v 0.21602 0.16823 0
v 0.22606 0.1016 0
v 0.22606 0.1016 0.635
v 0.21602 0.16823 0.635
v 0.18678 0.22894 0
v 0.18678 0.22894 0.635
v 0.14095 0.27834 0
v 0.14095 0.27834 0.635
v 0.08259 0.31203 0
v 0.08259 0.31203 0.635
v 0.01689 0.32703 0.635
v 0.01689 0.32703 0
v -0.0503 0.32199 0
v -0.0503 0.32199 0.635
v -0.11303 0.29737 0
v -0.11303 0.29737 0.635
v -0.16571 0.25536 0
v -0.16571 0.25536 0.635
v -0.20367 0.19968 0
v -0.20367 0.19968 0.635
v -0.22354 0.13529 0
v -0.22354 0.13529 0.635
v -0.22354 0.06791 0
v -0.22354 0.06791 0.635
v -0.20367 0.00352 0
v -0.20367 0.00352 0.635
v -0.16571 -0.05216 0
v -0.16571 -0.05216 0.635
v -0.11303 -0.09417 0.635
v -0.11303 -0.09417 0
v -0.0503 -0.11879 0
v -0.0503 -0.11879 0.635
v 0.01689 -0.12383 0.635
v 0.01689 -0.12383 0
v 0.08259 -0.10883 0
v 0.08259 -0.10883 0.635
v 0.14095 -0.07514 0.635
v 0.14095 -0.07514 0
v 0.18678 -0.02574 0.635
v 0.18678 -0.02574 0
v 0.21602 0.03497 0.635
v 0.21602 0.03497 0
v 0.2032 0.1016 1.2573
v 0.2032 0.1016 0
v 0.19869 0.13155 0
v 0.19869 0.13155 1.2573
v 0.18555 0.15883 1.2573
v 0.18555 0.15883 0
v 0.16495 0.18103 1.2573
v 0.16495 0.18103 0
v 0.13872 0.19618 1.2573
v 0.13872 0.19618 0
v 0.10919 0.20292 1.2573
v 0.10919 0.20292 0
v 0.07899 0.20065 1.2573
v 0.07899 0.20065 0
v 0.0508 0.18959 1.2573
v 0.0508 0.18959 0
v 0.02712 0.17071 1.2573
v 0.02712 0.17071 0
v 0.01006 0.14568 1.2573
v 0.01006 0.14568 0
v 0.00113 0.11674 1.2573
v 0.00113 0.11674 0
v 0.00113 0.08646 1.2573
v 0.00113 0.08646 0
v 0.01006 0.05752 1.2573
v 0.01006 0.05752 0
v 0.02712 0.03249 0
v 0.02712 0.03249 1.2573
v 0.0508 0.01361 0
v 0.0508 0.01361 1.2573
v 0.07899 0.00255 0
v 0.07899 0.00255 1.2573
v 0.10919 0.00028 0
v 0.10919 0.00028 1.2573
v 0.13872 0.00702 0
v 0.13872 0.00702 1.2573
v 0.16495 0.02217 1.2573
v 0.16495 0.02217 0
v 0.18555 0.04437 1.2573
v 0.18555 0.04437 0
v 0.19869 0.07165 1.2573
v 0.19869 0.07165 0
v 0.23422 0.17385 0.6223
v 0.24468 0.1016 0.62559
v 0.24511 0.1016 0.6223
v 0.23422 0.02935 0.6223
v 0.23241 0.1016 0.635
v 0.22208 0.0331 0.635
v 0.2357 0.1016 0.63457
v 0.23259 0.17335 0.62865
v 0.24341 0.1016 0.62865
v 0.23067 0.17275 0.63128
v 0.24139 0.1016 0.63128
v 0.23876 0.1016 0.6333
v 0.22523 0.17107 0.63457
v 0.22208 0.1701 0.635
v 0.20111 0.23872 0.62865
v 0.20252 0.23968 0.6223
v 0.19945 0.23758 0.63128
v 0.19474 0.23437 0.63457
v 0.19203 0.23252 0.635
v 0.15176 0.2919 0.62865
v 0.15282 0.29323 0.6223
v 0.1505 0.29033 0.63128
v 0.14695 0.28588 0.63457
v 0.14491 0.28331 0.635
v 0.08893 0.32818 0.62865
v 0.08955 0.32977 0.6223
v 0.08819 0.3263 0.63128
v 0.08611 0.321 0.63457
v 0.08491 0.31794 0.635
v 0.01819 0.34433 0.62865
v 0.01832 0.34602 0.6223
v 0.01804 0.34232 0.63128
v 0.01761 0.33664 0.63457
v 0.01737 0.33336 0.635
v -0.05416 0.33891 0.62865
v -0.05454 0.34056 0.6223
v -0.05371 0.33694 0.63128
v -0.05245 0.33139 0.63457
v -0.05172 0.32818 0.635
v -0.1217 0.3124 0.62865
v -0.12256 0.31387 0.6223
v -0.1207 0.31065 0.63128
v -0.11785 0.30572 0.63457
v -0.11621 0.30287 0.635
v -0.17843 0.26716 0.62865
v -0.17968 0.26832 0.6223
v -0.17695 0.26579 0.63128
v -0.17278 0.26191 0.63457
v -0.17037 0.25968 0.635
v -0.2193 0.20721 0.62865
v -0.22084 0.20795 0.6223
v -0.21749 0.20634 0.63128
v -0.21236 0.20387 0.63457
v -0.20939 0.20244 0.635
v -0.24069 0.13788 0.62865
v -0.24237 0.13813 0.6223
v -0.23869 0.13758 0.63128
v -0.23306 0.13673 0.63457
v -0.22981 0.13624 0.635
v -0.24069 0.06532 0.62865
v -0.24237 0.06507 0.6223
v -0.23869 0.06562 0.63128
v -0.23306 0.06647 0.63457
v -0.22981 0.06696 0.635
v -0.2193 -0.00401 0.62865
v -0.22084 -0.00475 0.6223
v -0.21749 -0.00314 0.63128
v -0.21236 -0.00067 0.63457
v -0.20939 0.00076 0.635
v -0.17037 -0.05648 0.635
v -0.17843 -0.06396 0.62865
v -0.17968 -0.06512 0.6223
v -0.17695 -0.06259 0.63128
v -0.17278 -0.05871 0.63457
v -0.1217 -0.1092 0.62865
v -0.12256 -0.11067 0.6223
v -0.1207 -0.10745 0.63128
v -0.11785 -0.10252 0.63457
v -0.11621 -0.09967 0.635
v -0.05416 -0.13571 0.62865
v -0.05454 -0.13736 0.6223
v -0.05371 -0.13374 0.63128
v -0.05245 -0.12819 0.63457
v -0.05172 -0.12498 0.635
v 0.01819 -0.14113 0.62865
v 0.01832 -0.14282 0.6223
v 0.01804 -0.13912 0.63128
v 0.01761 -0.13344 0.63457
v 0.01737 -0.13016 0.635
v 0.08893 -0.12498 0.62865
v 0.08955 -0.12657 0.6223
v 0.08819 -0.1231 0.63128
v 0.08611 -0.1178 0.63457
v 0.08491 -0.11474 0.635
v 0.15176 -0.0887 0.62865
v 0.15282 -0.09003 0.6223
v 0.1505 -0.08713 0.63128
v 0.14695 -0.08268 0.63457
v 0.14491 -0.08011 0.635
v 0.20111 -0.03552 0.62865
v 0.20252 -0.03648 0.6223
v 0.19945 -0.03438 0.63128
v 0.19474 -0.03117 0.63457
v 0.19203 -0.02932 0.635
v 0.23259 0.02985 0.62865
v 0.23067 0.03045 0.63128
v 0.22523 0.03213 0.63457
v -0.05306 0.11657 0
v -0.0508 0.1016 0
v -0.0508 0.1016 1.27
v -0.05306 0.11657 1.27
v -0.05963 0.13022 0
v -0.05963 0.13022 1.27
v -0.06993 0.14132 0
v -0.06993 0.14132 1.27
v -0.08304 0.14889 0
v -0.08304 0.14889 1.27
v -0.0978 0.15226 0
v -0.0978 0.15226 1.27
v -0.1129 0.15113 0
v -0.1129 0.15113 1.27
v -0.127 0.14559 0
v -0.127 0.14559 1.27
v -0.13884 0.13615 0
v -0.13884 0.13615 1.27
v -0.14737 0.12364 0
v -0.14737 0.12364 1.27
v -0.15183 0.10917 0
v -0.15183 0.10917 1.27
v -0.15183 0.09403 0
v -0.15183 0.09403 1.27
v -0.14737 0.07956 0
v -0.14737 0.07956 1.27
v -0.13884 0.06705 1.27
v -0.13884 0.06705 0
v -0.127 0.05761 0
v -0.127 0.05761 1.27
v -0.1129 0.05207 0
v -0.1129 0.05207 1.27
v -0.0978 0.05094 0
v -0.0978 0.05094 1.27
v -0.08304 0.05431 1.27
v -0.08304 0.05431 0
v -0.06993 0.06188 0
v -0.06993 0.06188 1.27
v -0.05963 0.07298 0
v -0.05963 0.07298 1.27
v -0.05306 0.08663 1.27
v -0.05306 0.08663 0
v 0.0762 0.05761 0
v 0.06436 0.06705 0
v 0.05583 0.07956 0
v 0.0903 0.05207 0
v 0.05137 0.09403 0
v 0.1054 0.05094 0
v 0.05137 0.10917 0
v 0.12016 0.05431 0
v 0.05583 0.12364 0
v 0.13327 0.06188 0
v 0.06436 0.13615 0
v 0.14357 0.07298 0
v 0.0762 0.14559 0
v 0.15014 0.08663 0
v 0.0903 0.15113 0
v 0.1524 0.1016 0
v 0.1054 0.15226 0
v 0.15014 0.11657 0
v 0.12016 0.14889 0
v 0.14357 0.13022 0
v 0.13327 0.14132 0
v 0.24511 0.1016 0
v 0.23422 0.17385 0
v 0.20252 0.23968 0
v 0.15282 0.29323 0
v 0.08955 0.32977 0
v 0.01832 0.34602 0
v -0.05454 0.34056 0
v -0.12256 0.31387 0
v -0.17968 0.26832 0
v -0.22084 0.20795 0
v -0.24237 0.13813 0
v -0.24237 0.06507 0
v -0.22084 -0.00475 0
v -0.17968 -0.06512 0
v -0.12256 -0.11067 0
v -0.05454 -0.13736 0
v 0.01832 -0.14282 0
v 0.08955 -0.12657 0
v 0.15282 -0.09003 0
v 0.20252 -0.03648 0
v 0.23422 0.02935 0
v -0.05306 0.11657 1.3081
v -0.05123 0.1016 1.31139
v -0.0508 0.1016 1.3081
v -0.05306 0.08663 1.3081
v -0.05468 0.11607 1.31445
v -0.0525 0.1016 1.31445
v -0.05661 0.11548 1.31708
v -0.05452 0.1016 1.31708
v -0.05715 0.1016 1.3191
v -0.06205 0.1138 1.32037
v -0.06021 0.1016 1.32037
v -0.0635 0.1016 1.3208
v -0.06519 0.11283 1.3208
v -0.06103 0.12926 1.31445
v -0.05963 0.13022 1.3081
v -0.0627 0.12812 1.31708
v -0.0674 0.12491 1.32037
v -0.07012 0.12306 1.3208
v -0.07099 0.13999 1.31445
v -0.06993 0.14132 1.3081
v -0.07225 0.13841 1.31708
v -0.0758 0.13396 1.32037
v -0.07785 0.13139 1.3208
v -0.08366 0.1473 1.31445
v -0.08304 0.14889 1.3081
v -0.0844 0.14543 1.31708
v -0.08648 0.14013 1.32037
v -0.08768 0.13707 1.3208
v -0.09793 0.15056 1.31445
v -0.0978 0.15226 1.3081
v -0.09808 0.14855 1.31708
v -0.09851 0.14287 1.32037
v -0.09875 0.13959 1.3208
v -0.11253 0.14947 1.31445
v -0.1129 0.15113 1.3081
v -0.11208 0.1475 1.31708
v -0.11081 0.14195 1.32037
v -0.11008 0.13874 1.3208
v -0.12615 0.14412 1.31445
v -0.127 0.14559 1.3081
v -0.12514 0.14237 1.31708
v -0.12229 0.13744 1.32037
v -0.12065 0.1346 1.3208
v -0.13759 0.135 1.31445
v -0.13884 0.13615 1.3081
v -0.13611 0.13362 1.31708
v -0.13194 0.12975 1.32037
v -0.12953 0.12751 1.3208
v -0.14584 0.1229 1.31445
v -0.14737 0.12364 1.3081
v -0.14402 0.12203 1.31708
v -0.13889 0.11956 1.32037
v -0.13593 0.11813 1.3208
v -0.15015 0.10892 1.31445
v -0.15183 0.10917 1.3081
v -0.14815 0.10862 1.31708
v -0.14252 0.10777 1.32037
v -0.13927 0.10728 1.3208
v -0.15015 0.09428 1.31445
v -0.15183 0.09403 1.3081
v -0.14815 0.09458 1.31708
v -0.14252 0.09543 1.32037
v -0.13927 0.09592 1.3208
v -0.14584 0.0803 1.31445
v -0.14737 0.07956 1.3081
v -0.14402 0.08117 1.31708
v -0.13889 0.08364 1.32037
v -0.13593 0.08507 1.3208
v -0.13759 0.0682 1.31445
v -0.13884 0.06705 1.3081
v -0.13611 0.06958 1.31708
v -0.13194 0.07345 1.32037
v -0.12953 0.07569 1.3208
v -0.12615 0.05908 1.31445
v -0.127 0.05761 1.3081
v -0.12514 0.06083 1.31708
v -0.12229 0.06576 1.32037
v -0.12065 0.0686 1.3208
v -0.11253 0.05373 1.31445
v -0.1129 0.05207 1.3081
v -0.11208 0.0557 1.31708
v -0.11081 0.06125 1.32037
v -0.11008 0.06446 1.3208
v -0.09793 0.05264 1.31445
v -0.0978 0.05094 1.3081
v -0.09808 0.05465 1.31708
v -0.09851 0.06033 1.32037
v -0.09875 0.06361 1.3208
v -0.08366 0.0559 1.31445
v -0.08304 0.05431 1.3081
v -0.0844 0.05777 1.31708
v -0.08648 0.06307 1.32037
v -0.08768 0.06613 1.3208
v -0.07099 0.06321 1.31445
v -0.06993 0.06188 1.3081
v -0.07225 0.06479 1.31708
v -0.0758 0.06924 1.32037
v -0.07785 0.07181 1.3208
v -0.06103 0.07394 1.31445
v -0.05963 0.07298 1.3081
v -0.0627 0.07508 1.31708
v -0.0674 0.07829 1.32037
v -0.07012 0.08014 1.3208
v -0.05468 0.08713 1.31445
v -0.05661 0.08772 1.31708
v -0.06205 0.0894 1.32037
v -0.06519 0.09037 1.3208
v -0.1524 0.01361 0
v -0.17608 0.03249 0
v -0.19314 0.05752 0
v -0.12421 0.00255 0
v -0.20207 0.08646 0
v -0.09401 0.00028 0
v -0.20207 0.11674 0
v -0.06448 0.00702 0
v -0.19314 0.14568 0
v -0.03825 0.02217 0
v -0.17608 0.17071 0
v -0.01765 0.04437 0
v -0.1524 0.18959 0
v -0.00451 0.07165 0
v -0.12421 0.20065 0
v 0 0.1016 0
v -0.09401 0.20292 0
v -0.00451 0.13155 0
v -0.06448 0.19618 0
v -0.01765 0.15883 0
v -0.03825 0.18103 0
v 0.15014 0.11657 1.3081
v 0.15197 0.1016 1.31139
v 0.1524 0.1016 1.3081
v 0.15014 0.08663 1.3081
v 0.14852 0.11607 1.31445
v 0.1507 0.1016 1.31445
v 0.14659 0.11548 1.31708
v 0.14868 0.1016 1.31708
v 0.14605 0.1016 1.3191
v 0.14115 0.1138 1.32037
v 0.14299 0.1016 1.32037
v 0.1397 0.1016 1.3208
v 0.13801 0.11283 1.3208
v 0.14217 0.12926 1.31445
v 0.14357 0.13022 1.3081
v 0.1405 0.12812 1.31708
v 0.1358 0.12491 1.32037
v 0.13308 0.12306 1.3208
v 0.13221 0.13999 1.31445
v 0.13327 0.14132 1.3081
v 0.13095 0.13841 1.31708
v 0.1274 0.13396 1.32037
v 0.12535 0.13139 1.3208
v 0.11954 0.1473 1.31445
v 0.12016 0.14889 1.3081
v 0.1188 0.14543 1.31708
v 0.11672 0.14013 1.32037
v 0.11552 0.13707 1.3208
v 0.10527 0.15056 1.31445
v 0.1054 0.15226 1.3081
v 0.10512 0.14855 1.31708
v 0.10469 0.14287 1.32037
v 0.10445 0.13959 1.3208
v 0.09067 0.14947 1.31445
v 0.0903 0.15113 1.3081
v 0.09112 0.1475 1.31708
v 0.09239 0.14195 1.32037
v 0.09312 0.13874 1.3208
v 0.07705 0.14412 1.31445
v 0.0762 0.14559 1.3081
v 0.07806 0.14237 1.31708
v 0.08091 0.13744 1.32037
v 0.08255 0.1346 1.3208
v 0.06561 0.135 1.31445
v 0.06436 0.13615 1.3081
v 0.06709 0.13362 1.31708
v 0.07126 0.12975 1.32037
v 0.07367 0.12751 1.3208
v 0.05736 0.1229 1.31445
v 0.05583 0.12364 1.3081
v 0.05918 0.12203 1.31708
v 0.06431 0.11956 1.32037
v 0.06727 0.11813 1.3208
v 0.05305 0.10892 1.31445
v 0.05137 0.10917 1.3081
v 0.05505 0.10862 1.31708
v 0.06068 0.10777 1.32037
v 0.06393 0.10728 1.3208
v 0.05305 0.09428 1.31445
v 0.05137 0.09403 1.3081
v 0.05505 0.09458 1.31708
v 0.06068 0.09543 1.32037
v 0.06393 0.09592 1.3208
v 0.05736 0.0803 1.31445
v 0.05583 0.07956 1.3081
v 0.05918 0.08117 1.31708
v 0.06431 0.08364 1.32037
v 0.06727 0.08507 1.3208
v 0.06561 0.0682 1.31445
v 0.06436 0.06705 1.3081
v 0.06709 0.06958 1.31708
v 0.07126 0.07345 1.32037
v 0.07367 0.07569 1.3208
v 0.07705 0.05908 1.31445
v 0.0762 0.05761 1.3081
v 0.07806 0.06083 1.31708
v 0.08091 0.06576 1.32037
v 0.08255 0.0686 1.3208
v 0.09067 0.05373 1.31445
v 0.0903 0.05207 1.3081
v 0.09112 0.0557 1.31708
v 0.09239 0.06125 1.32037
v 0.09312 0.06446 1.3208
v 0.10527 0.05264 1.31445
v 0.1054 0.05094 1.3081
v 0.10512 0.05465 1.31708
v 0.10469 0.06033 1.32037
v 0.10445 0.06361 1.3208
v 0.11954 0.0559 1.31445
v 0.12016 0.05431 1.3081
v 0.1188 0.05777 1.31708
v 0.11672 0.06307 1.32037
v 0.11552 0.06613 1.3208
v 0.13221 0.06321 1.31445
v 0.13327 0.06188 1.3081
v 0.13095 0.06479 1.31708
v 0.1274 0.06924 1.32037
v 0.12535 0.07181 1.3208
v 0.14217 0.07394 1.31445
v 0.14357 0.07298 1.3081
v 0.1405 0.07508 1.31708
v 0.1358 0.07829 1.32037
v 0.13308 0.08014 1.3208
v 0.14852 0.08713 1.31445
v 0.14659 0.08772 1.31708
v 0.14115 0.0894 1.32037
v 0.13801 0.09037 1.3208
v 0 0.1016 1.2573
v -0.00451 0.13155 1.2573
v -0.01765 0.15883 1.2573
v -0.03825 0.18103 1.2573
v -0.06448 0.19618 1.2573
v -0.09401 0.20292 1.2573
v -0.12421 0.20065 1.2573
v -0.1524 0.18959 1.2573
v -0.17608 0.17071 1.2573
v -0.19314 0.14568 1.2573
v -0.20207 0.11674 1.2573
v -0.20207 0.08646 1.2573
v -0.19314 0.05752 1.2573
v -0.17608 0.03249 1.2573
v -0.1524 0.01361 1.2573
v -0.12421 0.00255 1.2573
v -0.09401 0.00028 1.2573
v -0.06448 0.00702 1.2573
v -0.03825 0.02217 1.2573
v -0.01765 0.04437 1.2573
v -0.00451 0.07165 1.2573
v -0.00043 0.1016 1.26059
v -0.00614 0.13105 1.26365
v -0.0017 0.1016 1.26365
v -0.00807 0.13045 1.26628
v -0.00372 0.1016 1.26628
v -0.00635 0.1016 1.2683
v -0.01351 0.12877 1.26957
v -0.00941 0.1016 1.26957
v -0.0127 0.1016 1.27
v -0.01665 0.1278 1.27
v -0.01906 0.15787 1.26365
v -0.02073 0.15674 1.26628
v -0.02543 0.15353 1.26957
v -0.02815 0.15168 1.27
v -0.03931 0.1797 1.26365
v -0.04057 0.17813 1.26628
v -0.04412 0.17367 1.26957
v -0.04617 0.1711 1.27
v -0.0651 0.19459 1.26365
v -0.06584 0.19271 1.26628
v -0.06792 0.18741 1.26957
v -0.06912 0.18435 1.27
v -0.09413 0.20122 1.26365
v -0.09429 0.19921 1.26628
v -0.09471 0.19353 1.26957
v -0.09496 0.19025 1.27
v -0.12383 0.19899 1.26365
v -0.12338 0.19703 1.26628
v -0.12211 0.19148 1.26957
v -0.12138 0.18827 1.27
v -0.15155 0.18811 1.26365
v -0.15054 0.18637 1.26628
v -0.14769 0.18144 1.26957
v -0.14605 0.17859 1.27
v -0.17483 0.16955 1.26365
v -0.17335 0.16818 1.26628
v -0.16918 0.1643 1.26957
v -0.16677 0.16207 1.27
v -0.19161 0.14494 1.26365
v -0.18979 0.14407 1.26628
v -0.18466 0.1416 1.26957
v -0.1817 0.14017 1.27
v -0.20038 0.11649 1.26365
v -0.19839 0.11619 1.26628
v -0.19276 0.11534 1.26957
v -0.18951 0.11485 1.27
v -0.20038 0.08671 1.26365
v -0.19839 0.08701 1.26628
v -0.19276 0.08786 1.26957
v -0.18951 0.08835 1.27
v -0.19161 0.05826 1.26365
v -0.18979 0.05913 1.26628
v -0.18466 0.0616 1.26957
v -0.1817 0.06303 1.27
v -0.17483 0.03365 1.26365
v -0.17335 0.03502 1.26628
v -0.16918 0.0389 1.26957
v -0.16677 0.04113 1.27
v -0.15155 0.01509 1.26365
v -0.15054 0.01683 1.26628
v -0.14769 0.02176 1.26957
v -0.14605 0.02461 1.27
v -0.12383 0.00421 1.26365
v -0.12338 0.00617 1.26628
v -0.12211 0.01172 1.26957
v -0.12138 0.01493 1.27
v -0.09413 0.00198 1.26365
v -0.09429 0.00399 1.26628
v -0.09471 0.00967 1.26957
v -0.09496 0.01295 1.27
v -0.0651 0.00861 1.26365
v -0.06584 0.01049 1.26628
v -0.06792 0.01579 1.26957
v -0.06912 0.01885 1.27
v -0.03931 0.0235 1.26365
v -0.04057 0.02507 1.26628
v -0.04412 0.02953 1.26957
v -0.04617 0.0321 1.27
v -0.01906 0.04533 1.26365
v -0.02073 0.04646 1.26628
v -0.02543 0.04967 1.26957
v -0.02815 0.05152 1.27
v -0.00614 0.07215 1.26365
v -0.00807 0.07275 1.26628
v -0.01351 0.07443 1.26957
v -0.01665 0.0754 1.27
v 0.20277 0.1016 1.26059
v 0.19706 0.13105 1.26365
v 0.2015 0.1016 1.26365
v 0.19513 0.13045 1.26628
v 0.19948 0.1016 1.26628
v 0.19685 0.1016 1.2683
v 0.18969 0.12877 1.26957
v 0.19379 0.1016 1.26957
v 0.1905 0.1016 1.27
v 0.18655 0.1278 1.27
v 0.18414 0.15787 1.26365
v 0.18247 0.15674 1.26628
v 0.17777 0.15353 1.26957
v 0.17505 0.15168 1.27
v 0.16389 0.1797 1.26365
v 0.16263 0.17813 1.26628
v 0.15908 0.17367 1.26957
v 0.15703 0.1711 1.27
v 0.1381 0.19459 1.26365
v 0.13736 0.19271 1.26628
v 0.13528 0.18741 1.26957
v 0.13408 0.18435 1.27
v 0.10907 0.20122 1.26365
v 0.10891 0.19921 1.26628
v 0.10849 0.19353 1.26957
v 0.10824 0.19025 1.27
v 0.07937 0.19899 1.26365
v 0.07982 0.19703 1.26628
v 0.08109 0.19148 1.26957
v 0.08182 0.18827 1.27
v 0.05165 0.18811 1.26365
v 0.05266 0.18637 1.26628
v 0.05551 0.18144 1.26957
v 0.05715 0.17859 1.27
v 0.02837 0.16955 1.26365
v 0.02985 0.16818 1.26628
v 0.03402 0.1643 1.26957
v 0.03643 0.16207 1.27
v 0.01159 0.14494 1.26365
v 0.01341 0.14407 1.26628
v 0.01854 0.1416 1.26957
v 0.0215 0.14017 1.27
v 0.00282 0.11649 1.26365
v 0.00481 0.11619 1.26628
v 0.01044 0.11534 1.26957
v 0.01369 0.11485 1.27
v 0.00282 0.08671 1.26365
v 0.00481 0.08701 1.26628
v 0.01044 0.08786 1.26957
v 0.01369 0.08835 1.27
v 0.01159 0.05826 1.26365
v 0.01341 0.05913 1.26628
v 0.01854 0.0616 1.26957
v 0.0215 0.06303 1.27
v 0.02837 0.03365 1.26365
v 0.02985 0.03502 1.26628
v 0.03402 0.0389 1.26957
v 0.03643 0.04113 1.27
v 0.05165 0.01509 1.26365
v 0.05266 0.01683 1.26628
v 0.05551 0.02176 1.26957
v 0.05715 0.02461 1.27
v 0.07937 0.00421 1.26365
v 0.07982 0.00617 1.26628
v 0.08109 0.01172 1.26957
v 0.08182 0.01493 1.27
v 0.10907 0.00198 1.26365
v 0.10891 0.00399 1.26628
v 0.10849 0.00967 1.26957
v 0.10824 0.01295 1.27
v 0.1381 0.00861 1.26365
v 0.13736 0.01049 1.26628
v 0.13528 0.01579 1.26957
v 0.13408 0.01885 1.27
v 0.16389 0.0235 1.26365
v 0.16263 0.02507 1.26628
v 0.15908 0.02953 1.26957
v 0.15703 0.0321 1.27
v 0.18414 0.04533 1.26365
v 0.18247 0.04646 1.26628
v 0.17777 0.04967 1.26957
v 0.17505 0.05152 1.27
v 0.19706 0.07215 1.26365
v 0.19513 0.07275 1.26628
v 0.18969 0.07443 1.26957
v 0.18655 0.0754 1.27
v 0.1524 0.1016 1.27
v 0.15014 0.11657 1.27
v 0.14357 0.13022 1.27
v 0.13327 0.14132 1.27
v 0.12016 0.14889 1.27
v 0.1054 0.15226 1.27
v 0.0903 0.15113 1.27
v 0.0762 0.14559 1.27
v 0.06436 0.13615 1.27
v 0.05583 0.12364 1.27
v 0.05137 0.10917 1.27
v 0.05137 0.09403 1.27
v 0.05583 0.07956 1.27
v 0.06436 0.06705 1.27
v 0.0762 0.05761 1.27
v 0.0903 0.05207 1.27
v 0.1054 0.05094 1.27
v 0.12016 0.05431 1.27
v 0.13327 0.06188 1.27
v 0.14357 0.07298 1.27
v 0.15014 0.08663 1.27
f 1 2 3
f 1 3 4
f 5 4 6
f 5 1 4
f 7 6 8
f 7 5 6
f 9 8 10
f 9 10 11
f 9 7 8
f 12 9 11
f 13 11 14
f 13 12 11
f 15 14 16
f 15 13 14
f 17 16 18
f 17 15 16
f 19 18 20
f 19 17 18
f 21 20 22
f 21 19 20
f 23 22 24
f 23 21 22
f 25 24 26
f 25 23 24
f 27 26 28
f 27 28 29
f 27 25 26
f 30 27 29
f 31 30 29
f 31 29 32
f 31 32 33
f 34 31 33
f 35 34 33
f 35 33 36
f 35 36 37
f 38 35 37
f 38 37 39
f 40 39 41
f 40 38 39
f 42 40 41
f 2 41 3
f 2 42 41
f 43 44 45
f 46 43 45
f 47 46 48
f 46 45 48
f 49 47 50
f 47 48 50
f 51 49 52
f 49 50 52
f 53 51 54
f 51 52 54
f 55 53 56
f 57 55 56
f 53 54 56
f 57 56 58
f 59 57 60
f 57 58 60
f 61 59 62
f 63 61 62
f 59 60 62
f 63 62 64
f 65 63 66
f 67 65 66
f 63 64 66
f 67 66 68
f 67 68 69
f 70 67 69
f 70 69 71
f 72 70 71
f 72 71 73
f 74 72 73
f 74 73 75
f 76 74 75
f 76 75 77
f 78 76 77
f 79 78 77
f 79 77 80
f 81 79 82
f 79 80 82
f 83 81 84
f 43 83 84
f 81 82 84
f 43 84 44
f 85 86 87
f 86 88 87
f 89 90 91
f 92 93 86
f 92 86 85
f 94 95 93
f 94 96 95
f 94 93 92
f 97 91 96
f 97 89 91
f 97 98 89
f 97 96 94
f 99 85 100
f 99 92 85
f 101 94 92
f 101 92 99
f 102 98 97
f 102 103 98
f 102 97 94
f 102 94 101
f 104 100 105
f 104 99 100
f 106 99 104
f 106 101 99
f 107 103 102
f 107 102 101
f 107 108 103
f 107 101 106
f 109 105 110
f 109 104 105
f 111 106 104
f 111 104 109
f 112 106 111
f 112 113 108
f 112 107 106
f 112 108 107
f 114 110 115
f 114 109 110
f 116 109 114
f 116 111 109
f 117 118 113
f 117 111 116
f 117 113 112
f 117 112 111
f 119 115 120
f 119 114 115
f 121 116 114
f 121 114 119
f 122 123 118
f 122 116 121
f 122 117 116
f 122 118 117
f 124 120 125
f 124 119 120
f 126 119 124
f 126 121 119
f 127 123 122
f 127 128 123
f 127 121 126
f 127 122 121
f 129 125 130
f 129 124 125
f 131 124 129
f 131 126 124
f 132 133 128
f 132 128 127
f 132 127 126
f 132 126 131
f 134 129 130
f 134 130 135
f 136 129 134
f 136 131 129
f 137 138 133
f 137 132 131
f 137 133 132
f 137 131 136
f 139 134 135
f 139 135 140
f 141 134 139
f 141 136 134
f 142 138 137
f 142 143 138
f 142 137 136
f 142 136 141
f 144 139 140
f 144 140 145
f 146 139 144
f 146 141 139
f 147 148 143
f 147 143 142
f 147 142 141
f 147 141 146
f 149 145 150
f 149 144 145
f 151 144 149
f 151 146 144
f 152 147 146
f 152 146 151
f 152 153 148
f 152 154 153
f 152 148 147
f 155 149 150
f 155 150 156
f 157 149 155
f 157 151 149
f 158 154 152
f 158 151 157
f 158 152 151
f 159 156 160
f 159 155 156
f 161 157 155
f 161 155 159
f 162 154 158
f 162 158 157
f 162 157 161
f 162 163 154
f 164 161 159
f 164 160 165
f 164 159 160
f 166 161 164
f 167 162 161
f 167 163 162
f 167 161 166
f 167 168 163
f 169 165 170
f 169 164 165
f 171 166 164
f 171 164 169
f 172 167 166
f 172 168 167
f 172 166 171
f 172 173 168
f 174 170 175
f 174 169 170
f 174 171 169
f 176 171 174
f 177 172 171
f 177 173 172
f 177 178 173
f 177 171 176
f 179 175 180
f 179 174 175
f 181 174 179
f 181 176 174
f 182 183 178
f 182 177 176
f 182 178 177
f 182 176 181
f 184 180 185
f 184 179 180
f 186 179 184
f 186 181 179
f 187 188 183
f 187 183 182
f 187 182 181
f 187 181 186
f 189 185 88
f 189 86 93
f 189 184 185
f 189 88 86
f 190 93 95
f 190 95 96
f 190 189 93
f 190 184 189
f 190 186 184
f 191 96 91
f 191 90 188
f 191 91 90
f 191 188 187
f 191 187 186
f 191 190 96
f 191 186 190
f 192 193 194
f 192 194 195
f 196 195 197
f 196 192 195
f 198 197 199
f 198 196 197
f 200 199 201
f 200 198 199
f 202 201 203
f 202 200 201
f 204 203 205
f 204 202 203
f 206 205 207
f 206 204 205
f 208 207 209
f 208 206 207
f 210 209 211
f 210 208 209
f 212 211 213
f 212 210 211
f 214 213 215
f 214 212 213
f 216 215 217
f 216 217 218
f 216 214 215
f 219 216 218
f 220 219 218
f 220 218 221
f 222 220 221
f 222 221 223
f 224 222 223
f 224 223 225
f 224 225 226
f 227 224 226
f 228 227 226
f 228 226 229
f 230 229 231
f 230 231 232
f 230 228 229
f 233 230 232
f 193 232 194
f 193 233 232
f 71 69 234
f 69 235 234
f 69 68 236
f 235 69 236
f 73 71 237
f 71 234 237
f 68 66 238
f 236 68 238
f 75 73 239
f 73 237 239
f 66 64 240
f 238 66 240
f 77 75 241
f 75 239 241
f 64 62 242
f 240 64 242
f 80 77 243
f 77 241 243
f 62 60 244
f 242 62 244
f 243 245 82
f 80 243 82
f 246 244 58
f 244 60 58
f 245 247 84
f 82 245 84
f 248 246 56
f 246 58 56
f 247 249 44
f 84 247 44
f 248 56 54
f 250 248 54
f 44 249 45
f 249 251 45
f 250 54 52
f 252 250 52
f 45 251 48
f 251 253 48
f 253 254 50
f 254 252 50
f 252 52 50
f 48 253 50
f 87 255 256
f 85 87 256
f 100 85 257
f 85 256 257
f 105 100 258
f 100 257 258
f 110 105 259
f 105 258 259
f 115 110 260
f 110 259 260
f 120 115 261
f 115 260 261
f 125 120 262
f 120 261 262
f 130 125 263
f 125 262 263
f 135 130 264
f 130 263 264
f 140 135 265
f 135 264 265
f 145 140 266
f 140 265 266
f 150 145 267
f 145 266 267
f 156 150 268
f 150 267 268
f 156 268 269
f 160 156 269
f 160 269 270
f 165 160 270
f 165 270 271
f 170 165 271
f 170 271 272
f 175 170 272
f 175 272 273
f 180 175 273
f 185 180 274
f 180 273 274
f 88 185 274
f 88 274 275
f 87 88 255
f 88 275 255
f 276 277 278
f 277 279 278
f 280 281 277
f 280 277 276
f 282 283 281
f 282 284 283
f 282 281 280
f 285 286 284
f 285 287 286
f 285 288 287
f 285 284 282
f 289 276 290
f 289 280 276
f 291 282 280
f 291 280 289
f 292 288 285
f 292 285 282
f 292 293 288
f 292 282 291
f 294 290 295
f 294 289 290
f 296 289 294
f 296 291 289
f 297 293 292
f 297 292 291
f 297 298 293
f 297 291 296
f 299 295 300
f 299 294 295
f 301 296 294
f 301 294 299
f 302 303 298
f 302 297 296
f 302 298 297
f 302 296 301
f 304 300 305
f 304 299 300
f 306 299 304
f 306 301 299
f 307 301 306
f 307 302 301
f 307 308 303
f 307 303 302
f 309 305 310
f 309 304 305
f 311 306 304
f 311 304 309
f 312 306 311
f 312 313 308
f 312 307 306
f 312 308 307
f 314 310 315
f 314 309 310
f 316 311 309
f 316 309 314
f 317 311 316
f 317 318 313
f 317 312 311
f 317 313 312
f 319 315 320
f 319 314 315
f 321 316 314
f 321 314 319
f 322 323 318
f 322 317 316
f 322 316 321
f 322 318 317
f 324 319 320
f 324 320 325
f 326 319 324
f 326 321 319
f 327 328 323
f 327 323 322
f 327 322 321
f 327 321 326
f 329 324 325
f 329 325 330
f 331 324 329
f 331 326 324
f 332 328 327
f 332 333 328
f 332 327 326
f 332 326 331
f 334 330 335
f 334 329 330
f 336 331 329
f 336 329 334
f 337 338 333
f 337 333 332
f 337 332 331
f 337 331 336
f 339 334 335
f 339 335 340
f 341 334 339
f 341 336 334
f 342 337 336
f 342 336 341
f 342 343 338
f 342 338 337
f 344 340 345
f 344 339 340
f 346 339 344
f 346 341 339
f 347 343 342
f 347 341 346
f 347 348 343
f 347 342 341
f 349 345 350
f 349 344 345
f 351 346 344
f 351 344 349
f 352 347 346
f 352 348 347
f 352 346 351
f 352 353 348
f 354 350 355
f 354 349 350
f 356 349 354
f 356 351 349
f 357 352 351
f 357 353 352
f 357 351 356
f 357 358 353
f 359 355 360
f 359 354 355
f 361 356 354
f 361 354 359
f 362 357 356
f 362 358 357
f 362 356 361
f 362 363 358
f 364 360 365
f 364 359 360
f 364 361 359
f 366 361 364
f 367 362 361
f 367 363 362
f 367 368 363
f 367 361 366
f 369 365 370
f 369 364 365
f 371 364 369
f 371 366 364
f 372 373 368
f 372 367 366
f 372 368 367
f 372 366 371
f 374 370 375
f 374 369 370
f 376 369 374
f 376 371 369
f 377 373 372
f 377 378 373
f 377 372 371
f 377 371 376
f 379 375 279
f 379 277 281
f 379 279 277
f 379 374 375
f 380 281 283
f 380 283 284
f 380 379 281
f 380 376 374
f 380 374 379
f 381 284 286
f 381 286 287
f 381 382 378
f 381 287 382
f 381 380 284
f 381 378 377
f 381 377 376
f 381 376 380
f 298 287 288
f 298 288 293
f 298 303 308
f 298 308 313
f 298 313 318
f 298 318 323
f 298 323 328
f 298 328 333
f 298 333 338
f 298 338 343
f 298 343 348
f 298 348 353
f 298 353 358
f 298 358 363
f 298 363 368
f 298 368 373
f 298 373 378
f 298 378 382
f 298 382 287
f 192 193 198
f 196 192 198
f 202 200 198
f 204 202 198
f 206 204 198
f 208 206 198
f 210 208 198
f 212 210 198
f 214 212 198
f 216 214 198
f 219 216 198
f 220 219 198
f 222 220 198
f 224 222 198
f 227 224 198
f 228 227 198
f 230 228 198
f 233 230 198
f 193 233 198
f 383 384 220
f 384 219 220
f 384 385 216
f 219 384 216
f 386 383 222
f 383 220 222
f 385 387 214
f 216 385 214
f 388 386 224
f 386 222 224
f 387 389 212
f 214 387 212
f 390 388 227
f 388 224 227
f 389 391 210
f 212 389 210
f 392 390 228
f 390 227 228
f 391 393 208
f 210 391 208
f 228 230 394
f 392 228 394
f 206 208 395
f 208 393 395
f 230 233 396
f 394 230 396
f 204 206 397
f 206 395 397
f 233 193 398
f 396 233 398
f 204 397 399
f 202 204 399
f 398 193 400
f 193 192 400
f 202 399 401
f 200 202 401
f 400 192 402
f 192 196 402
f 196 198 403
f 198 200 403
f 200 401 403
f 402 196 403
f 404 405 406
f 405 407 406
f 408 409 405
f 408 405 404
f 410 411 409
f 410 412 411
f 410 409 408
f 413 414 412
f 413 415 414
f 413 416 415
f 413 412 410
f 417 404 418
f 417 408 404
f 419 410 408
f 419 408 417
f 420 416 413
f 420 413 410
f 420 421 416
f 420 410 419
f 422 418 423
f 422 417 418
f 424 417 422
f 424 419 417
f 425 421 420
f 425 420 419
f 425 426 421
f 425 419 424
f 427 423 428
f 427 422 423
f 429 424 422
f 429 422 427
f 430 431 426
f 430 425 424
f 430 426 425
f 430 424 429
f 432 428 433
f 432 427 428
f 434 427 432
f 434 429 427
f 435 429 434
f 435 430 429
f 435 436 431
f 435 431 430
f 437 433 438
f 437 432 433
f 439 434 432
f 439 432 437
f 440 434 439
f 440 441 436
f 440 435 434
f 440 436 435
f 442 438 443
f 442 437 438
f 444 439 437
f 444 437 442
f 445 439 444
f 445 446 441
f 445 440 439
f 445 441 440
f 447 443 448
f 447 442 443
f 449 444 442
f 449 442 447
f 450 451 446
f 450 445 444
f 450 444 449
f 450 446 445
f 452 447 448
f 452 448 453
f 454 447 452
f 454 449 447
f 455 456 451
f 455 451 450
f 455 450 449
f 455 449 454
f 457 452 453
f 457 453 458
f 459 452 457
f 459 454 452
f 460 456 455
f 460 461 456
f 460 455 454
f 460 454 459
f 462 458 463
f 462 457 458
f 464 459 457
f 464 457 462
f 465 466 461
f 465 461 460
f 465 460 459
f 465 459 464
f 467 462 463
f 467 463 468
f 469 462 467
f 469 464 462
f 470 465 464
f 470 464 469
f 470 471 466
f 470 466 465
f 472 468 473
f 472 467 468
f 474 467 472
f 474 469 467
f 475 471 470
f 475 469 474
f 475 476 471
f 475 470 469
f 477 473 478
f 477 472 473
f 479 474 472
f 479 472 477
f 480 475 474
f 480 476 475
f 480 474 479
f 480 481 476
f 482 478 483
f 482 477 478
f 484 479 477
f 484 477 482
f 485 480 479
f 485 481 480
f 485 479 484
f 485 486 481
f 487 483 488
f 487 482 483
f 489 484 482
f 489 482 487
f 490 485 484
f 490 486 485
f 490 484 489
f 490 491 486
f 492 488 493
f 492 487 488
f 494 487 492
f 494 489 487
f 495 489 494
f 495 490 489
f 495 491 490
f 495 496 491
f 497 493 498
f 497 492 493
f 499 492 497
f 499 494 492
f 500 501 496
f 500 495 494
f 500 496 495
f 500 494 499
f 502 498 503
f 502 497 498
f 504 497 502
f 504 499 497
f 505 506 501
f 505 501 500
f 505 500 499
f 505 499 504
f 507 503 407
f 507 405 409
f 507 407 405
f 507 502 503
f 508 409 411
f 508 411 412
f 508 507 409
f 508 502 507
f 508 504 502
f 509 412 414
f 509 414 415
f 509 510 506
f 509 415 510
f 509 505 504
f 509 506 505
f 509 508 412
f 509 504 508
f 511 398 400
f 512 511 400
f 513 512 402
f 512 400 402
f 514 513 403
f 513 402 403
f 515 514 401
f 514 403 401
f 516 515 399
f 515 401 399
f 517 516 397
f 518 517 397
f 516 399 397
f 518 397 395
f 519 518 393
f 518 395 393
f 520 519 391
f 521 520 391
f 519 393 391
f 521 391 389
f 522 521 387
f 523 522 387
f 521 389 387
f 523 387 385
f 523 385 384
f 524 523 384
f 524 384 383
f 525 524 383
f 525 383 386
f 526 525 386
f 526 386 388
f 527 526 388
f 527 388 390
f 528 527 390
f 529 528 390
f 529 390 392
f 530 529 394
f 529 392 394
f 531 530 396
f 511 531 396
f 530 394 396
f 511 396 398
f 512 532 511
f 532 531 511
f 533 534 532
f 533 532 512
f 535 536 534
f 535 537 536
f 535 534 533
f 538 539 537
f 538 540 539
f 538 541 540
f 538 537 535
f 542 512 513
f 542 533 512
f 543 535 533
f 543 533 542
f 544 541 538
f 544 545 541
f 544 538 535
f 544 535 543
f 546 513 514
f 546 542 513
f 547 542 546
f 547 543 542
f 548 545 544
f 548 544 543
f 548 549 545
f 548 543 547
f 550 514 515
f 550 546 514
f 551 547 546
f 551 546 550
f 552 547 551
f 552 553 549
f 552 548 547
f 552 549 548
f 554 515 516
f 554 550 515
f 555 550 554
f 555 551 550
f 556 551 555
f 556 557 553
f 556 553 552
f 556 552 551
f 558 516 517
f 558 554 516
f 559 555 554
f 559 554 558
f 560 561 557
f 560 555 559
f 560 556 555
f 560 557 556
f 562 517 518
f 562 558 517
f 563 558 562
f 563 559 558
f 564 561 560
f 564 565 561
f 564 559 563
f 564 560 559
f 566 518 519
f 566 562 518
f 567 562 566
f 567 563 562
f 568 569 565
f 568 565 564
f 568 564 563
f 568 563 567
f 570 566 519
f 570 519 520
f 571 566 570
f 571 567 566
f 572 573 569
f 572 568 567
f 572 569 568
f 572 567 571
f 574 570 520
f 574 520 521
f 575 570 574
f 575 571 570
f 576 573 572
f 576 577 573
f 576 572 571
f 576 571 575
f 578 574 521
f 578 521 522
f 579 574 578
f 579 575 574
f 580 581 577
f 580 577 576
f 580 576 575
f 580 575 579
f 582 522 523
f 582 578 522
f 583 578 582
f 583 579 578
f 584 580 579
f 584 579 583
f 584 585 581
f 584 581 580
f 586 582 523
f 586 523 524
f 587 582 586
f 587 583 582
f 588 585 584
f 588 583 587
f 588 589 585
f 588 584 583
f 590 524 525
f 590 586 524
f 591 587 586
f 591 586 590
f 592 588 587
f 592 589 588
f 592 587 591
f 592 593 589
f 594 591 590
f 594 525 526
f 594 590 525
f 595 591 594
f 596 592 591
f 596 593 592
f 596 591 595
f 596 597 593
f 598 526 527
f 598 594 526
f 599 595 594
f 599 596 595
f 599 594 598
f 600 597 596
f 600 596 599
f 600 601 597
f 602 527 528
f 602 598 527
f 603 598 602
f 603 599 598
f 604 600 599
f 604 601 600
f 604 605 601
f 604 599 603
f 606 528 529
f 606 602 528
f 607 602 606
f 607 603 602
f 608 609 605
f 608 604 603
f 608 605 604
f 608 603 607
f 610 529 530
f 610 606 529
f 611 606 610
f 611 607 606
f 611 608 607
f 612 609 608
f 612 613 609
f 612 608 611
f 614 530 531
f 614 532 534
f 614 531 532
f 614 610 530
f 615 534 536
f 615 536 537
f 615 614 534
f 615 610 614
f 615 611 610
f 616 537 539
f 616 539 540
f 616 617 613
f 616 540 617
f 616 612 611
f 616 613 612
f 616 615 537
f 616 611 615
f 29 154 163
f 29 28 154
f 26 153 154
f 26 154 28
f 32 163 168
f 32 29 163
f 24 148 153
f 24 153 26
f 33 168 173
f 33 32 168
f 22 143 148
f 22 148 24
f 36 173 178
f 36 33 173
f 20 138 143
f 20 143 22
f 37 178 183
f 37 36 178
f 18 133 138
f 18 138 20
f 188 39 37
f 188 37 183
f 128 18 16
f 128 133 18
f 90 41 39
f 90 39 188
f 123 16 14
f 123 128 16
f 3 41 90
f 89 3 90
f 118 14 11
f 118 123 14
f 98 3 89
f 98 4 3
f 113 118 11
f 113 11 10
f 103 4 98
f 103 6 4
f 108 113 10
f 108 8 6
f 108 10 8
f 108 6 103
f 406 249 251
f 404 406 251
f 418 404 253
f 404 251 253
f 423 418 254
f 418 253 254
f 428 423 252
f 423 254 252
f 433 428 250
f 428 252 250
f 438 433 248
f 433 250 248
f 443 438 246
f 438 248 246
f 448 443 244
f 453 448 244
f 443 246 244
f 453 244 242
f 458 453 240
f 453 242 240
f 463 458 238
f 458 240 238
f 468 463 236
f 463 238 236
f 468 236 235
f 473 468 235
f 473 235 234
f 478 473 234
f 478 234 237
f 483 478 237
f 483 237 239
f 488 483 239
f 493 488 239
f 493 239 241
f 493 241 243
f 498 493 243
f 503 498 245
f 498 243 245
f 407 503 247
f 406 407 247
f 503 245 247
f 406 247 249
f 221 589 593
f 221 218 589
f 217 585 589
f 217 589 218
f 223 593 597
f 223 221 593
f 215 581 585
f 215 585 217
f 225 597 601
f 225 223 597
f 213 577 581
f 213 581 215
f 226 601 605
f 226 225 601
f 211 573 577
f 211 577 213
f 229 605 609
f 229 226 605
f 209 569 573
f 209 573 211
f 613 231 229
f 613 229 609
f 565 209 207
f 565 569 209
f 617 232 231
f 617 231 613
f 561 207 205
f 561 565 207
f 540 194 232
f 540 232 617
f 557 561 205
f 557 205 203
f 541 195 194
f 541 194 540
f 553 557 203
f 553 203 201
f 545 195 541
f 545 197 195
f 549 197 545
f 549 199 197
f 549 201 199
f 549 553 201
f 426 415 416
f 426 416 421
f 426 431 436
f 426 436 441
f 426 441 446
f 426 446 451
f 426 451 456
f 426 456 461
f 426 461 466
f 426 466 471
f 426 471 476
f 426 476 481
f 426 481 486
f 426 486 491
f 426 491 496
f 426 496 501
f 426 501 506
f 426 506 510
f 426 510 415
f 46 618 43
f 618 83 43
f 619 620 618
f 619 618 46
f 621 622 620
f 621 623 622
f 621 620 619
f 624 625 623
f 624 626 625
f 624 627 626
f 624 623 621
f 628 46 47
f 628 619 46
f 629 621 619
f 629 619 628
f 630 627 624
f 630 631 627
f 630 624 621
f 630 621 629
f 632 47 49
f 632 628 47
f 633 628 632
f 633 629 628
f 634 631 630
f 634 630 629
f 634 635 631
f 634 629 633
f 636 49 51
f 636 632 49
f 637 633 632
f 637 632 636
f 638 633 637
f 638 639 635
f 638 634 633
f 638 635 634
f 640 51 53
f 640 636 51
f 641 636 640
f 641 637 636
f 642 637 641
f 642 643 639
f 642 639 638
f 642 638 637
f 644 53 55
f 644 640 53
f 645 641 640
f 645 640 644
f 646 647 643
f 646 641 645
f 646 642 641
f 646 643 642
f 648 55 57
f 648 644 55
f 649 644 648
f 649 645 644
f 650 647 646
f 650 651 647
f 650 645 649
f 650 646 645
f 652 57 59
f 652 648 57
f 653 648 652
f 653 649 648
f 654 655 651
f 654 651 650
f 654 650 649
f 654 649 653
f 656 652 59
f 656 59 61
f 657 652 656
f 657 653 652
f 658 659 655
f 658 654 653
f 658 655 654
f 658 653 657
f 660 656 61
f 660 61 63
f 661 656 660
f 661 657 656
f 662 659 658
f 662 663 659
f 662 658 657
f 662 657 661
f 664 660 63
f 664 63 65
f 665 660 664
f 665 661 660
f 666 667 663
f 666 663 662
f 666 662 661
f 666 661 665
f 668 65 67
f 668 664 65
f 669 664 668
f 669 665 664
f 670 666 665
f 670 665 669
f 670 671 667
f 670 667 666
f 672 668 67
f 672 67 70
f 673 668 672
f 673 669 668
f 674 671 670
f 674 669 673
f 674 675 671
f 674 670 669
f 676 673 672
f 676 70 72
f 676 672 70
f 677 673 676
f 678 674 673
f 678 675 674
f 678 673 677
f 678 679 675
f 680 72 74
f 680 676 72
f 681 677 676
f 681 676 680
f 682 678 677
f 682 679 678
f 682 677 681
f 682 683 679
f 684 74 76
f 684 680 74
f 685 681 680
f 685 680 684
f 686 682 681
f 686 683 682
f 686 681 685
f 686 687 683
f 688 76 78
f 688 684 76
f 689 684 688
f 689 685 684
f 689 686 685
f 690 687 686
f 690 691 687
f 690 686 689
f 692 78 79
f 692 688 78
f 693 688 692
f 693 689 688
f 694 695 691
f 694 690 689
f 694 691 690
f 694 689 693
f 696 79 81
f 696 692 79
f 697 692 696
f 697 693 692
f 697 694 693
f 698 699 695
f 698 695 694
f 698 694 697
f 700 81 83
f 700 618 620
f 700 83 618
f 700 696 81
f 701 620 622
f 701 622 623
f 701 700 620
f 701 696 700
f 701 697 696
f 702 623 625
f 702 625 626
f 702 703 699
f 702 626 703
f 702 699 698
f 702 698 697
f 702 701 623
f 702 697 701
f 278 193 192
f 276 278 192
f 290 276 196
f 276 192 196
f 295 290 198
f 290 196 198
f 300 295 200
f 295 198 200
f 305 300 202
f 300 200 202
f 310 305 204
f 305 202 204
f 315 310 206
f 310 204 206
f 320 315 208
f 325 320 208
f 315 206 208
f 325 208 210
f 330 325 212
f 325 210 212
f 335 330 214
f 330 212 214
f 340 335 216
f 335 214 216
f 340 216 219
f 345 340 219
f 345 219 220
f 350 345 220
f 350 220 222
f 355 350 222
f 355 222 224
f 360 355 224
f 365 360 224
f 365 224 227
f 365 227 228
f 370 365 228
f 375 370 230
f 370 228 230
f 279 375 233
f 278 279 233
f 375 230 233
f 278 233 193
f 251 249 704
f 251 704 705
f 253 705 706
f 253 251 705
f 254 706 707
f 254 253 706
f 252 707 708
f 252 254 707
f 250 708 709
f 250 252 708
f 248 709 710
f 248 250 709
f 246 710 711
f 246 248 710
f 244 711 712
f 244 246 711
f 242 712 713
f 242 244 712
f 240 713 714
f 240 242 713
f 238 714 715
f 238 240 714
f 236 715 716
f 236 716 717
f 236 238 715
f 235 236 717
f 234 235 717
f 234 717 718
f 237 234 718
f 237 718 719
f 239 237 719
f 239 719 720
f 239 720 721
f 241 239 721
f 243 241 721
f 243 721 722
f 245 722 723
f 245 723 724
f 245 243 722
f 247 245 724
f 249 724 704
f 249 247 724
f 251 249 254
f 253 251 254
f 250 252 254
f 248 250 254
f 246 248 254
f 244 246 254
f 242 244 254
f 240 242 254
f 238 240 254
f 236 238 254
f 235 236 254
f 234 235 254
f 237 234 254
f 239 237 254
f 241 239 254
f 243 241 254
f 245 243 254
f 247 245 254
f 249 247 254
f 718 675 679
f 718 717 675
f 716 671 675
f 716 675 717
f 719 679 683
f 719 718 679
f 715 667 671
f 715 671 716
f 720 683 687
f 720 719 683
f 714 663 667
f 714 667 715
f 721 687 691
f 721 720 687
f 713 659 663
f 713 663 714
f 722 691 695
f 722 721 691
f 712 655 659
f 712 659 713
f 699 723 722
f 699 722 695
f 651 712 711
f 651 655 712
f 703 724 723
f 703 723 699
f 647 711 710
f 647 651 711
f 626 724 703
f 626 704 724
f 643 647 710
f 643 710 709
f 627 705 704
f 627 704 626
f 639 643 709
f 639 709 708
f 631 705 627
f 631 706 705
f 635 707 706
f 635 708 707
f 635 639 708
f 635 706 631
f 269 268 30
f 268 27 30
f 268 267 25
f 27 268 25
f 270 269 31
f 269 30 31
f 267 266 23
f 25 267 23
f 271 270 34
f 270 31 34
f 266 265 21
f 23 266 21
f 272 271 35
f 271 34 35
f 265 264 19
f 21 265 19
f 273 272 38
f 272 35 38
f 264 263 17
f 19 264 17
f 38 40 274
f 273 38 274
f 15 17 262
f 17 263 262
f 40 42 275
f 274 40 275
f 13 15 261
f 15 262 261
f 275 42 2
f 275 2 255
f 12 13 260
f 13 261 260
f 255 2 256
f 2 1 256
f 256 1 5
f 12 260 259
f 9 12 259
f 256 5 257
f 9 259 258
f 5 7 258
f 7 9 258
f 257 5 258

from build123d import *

# Parameters (mm, degrees)
SKETCH1_9_R           = 0.1016
SKETCH1_9_R_2         = 0.0508
BOSS_EXTRUDE3_DEPTH   = 1.27
BOSS_EXTRUDE3_2_DEPTH = 1.27
SKETCH1_R             = 0.24511
SKETCH1_R_2           = 0.22606
BOSS_EXTRUDE4_DEPTH   = 0.635
SKETCH1_12_R          = 0.0508
BOSS_EXTRUDE5_DEPTH   = 1.3208
FILLET3_R             = 0.0127
SKETCH1_14_R          = 0.0508
BOSS_EXTRUDE7_DEPTH   = 1.3208
FILLET4_R             = 0.0127
FILLET5_R             = 0.0127
FILLET6_R             = 0.0127
FILLET11_R            = 0.0127


with BuildPart() as part:
    # Sketch1<9> → Boss-Extrude3 (new body)
    with BuildSketch(Plane.XY):
        with Locations((-0.1016, 0.1016)):
            Circle(SKETCH1_9_R)
        with Locations((-0.1016, 0.1016)):
            Circle(SKETCH1_9_R_2, mode=Mode.SUBTRACT)
    extrude(amount=BOSS_EXTRUDE3_DEPTH)

    # Fillet6
    fillet6_edges = [part.edges().sort_by_distance(p)[0] for p in [
        (-0.2032, 0.1016, 1.27),
    ]]
    fillet(fillet6_edges, radius=FILLET6_R)


with BuildPart() as body_2:
    # Sketch1<9> → Boss-Extrude3 2 (new body)
    with BuildSketch(Plane.XY):
        with Locations((0.1016, 0.1016)):
            Circle(SKETCH1_9_R)
        with Locations((0.1016, 0.1016)):
            Circle(SKETCH1_9_R_2, mode=Mode.SUBTRACT)
    extrude(amount=BOSS_EXTRUDE3_2_DEPTH)

    # Fillet5
    fillet5_edges = [body_2.edges().sort_by_distance(p)[0] for p in [
        (0, 0.1016, 1.27),
    ]]
    fillet(fillet5_edges, radius=FILLET5_R)


with BuildPart() as body_3:
    # Sketch1 → Boss-Extrude4 (new body)
    with BuildSketch(Plane.XY):
        with Locations((0, 0.1016)):
            Circle(SKETCH1_R)
        with Locations((0, 0.1016)):
            Circle(SKETCH1_R_2, mode=Mode.SUBTRACT)
    extrude(amount=BOSS_EXTRUDE4_DEPTH)

    # Fillet11
    fillet11_edges = [body_3.edges().sort_by_distance(p)[0] for p in [
        (-0.24511, 0.1016, 0.635),
    ]]
    fillet(fillet11_edges, radius=FILLET11_R)


with BuildPart() as body_4:
    # Sketch1<12> → Boss-Extrude5 (new body)
    with BuildSketch(Plane.XY):
        with Locations((-0.1016, 0.1016)):
            Circle(SKETCH1_12_R)
    extrude(amount=BOSS_EXTRUDE5_DEPTH)

    # Fillet3
    fillet3_edges = [body_4.edges().sort_by_distance(p)[0] for p in [
        (-0.1524, 0.1016, 1.3208),
    ]]
    fillet(fillet3_edges, radius=FILLET3_R)


with BuildPart() as body_5:
    # Sketch1<14> → Boss-Extrude7 (new body)
    with BuildSketch(Plane.XY):
        with Locations((0.1016, 0.1016)):
            Circle(SKETCH1_14_R)
    extrude(amount=BOSS_EXTRUDE7_DEPTH)

    # Fillet4
    fillet4_edges = [body_5.edges().sort_by_distance(p)[0] for p in [
        (0.0508, 0.1016, 1.3208),
    ]]
    fillet(fillet4_edges, radius=FILLET4_R)


solid = Compound([part.part, body_2.part, body_3.part, body_4.part, body_5.part])
